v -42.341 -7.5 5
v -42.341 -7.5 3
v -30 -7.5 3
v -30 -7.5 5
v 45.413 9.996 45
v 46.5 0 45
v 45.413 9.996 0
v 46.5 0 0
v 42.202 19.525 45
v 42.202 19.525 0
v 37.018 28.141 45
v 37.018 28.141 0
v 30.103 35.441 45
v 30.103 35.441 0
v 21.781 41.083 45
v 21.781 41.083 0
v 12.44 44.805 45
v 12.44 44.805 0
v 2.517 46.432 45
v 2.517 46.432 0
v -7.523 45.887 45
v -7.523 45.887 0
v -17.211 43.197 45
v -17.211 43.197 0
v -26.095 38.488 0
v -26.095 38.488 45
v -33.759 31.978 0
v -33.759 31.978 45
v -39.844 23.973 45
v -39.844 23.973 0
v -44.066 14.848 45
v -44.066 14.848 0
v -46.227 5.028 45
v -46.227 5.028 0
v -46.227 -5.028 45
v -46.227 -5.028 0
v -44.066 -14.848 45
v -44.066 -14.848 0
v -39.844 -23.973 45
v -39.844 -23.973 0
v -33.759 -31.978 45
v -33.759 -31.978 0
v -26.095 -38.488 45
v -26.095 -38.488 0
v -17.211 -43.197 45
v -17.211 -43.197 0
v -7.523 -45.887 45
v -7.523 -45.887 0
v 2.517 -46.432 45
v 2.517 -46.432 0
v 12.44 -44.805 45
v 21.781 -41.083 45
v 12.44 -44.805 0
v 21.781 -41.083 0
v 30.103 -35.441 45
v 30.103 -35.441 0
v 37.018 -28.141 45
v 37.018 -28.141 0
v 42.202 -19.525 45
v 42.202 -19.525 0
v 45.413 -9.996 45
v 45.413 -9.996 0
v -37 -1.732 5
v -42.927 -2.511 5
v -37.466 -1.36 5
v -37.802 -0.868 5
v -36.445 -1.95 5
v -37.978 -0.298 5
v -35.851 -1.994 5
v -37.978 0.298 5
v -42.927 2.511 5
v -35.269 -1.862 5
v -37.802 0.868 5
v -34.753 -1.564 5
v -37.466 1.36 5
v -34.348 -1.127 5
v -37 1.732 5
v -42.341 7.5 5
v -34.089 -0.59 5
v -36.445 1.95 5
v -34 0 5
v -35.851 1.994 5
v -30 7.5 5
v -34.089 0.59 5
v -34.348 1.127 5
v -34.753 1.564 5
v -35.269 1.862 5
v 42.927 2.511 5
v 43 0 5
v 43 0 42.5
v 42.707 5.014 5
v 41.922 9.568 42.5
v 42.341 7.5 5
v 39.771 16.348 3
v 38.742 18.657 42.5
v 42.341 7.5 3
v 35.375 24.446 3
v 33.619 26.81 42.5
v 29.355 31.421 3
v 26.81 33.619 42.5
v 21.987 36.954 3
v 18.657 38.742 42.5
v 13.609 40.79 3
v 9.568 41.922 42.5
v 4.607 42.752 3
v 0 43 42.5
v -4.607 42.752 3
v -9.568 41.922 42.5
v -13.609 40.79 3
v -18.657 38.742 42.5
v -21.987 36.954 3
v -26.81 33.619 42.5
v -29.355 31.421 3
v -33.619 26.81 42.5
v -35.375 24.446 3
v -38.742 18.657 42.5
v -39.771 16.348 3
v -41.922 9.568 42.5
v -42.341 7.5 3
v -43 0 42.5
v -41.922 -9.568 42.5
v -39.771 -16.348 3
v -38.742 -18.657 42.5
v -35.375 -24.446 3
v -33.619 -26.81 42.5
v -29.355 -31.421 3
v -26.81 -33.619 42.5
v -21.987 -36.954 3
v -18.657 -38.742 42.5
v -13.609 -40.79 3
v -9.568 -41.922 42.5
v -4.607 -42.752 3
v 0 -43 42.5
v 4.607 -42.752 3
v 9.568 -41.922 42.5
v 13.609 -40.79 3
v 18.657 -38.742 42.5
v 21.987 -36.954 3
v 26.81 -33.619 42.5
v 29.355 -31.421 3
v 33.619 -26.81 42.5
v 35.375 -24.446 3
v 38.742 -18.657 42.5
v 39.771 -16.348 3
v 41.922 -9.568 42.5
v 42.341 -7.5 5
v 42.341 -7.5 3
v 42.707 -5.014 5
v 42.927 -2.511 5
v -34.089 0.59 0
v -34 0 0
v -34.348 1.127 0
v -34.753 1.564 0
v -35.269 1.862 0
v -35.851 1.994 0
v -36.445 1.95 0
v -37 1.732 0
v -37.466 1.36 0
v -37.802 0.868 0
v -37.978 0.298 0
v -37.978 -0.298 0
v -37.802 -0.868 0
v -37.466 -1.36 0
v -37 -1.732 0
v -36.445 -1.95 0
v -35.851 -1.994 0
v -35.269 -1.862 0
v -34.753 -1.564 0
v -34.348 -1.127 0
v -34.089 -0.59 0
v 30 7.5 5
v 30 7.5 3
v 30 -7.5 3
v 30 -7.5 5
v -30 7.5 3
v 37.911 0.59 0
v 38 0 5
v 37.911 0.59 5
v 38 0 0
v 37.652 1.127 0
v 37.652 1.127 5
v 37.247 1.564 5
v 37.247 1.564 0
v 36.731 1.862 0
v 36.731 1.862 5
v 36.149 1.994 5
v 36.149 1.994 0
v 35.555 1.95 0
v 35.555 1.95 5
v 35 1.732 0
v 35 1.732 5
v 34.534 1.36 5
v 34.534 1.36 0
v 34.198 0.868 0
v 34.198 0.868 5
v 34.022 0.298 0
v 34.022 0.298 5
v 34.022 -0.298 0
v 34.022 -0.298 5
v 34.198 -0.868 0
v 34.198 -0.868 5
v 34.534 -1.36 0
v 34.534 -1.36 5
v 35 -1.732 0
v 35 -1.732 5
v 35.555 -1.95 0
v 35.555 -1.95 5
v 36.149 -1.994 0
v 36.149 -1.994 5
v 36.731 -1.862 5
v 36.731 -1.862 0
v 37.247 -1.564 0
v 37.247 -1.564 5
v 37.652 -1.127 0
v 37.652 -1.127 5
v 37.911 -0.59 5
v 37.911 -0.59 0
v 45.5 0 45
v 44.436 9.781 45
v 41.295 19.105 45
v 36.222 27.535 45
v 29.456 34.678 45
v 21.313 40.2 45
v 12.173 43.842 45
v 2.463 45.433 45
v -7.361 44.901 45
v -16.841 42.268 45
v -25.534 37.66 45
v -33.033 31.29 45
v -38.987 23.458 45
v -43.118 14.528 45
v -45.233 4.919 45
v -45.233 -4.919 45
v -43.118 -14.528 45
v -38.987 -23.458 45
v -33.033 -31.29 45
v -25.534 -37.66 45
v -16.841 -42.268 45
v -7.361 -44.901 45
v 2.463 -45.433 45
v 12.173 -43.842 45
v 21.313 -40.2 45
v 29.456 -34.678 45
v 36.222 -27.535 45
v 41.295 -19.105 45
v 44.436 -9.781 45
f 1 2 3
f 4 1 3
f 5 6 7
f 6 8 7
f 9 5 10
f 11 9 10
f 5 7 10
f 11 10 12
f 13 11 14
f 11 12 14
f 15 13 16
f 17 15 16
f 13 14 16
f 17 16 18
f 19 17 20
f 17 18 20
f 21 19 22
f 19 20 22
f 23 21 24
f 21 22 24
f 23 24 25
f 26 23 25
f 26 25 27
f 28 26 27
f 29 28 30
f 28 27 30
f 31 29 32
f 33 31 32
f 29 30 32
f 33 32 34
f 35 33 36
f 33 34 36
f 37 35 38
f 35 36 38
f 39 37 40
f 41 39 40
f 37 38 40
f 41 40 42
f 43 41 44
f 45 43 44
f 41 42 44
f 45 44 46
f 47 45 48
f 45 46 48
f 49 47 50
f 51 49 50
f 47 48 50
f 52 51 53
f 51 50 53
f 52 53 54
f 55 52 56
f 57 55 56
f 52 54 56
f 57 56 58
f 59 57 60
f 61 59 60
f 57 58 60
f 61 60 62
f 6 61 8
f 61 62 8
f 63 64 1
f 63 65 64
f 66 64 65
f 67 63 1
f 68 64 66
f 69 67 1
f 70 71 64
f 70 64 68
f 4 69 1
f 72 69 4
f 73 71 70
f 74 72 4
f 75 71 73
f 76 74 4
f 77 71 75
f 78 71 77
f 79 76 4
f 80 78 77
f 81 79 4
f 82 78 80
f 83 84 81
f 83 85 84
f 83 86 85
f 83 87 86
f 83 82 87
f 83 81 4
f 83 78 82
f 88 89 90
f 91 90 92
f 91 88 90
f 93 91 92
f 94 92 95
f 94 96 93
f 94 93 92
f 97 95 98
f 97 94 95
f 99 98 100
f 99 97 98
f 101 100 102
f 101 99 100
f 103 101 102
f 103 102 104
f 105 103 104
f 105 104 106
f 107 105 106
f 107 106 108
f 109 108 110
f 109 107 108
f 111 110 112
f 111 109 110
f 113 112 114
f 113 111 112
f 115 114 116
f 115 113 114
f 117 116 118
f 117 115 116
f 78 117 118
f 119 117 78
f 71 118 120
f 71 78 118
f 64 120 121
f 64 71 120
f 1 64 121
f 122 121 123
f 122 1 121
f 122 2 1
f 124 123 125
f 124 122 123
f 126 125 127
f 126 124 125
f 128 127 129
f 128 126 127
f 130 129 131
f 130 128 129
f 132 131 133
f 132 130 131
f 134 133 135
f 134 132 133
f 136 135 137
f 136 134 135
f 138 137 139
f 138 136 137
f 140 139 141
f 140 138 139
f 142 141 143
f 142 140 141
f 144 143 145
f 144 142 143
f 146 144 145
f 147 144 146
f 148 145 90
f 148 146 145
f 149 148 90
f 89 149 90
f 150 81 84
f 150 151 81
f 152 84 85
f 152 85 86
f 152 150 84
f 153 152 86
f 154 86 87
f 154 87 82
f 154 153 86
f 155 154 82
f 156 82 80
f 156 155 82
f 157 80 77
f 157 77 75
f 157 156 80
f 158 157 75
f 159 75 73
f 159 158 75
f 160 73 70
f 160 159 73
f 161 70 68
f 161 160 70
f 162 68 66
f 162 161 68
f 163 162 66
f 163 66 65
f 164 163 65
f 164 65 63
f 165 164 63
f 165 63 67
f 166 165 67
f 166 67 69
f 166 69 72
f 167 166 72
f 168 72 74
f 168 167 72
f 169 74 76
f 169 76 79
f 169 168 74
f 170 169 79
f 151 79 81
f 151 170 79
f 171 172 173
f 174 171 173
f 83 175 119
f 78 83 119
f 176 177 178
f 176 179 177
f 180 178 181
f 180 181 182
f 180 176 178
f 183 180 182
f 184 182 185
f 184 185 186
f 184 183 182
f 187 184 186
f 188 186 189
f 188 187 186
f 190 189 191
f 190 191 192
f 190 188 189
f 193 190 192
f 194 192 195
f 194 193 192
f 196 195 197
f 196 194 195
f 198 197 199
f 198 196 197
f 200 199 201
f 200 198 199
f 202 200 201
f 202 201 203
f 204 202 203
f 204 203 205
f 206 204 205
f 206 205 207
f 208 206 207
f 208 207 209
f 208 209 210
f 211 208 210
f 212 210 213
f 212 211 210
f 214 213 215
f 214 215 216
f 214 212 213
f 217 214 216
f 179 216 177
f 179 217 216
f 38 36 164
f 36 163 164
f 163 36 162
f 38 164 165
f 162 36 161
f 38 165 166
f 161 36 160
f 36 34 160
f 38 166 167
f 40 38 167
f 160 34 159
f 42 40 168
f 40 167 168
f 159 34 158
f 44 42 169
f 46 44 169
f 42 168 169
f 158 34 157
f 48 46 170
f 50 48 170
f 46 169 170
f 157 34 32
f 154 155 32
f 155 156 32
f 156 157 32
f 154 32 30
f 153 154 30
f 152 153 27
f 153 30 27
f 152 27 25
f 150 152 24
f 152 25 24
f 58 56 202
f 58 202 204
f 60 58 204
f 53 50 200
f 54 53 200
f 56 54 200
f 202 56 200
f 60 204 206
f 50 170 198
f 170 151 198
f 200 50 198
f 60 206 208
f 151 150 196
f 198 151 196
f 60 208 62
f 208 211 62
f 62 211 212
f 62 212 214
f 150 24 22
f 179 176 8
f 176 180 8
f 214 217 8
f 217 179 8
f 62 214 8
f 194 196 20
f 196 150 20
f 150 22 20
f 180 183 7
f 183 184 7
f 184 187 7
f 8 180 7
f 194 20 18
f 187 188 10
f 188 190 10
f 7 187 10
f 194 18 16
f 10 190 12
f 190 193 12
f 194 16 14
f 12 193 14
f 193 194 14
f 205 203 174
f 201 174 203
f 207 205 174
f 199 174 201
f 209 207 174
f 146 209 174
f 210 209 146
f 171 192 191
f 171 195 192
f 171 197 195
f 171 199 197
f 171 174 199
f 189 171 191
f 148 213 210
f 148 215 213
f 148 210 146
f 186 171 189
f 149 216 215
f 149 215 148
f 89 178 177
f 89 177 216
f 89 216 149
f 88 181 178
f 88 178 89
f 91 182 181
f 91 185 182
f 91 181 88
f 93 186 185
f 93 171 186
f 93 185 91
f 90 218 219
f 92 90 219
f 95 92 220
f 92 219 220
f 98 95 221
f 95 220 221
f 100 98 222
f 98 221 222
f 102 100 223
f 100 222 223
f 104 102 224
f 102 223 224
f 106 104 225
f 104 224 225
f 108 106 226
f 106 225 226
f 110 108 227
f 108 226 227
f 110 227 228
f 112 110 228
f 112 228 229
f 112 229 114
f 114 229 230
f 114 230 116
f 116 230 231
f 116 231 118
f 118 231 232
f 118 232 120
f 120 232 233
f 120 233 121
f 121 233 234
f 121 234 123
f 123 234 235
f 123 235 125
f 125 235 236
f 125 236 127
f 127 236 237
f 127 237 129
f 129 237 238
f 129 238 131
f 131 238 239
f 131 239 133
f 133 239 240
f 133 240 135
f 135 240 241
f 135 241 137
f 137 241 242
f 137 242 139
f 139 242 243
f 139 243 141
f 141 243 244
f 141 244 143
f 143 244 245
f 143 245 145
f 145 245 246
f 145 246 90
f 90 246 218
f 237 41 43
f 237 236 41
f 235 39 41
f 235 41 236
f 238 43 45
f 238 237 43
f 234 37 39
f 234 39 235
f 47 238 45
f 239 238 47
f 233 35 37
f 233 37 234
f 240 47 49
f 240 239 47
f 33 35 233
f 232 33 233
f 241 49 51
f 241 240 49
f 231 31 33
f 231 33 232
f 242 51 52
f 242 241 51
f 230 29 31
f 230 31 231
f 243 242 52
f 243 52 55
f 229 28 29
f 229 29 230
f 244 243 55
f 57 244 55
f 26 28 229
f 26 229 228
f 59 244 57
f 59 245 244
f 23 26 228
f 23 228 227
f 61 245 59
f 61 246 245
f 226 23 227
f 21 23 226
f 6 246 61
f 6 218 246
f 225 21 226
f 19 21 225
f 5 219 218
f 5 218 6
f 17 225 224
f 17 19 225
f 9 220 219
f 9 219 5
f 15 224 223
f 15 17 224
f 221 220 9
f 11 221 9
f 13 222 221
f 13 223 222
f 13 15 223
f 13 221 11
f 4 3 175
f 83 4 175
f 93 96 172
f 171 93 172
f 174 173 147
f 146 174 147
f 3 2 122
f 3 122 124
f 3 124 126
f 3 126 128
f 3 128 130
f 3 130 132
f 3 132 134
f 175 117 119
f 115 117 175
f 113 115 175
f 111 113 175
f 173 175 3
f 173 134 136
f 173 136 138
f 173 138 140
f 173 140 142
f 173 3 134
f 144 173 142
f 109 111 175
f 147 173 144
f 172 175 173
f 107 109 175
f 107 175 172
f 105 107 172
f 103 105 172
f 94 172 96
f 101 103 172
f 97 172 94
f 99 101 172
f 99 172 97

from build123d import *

# Parameters (mm, degrees)
F0_R     = 46.5
F0_R_2   = 2
F1_DEPTH = 3
F2_R     = 46.5
F2_R_2   = 43
F3_DEPTH = 42
F4_SIZE  = 2.5
F5_R     = 2
F6_DEPTH = 2


with BuildPart() as f1:
    # F0 (on Top) → F1 (new body)
    with BuildSketch(Plane.XY):
        Circle(F0_R)
        with Locations((-36, 0)):
            Circle(F0_R_2, mode=Mode.SUBTRACT)
        with Locations((36, 0)):
            Circle(F0_R_2, mode=Mode.SUBTRACT)
    extrude(amount=F1_DEPTH)

    # F2 (on face) → F3 (join)
    with BuildSketch(Plane.XY.offset(3)):
        Circle(F2_R)
        Circle(F2_R_2, mode=Mode.SUBTRACT)
    extrude(amount=F3_DEPTH)

    # F4
    f4_edges = [f1.edges().sort_by_distance(p)[0] for p in [
        (-43, 0, 45),
    ]]
    chamfer(f4_edges, length=F4_SIZE)

    # F5 (on face) → F6 (join)
    with BuildSketch(Plane.XY.offset(3)):
        with BuildLine():
            Line((-30, -7.5), (-30, 7.5))
            Line((-30, 7.5), (-42.3408785927, 7.5))
            ThreePointArc((-42.3408785927, 7.5), (-43, 0), (-42.3408785927, -7.5))
            Line((-42.3408785927, -7.5), (-30, -7.5))
        make_face()
        with Locations((-36, 0)):
            Circle(F5_R, mode=Mode.SUBTRACT)
        with BuildLine():
            ThreePointArc((43, 0), (42.834902705, 3.7644535138), (42.3408785927, 7.5))
            Line((42.3408785927, 7.5), (30, 7.5))
            Line((30, 7.5), (30, -7.5))
            Line((30, -7.5), (42.3408785927, -7.5))
            ThreePointArc((42.3408785927, -7.5), (42.834902705, -3.7644535138), (43, 0))
        make_face()
        with Locations((36, 0)):
            Circle(F5_R, mode=Mode.SUBTRACT)
    extrude(amount=F6_DEPTH)


solid = f1.part
